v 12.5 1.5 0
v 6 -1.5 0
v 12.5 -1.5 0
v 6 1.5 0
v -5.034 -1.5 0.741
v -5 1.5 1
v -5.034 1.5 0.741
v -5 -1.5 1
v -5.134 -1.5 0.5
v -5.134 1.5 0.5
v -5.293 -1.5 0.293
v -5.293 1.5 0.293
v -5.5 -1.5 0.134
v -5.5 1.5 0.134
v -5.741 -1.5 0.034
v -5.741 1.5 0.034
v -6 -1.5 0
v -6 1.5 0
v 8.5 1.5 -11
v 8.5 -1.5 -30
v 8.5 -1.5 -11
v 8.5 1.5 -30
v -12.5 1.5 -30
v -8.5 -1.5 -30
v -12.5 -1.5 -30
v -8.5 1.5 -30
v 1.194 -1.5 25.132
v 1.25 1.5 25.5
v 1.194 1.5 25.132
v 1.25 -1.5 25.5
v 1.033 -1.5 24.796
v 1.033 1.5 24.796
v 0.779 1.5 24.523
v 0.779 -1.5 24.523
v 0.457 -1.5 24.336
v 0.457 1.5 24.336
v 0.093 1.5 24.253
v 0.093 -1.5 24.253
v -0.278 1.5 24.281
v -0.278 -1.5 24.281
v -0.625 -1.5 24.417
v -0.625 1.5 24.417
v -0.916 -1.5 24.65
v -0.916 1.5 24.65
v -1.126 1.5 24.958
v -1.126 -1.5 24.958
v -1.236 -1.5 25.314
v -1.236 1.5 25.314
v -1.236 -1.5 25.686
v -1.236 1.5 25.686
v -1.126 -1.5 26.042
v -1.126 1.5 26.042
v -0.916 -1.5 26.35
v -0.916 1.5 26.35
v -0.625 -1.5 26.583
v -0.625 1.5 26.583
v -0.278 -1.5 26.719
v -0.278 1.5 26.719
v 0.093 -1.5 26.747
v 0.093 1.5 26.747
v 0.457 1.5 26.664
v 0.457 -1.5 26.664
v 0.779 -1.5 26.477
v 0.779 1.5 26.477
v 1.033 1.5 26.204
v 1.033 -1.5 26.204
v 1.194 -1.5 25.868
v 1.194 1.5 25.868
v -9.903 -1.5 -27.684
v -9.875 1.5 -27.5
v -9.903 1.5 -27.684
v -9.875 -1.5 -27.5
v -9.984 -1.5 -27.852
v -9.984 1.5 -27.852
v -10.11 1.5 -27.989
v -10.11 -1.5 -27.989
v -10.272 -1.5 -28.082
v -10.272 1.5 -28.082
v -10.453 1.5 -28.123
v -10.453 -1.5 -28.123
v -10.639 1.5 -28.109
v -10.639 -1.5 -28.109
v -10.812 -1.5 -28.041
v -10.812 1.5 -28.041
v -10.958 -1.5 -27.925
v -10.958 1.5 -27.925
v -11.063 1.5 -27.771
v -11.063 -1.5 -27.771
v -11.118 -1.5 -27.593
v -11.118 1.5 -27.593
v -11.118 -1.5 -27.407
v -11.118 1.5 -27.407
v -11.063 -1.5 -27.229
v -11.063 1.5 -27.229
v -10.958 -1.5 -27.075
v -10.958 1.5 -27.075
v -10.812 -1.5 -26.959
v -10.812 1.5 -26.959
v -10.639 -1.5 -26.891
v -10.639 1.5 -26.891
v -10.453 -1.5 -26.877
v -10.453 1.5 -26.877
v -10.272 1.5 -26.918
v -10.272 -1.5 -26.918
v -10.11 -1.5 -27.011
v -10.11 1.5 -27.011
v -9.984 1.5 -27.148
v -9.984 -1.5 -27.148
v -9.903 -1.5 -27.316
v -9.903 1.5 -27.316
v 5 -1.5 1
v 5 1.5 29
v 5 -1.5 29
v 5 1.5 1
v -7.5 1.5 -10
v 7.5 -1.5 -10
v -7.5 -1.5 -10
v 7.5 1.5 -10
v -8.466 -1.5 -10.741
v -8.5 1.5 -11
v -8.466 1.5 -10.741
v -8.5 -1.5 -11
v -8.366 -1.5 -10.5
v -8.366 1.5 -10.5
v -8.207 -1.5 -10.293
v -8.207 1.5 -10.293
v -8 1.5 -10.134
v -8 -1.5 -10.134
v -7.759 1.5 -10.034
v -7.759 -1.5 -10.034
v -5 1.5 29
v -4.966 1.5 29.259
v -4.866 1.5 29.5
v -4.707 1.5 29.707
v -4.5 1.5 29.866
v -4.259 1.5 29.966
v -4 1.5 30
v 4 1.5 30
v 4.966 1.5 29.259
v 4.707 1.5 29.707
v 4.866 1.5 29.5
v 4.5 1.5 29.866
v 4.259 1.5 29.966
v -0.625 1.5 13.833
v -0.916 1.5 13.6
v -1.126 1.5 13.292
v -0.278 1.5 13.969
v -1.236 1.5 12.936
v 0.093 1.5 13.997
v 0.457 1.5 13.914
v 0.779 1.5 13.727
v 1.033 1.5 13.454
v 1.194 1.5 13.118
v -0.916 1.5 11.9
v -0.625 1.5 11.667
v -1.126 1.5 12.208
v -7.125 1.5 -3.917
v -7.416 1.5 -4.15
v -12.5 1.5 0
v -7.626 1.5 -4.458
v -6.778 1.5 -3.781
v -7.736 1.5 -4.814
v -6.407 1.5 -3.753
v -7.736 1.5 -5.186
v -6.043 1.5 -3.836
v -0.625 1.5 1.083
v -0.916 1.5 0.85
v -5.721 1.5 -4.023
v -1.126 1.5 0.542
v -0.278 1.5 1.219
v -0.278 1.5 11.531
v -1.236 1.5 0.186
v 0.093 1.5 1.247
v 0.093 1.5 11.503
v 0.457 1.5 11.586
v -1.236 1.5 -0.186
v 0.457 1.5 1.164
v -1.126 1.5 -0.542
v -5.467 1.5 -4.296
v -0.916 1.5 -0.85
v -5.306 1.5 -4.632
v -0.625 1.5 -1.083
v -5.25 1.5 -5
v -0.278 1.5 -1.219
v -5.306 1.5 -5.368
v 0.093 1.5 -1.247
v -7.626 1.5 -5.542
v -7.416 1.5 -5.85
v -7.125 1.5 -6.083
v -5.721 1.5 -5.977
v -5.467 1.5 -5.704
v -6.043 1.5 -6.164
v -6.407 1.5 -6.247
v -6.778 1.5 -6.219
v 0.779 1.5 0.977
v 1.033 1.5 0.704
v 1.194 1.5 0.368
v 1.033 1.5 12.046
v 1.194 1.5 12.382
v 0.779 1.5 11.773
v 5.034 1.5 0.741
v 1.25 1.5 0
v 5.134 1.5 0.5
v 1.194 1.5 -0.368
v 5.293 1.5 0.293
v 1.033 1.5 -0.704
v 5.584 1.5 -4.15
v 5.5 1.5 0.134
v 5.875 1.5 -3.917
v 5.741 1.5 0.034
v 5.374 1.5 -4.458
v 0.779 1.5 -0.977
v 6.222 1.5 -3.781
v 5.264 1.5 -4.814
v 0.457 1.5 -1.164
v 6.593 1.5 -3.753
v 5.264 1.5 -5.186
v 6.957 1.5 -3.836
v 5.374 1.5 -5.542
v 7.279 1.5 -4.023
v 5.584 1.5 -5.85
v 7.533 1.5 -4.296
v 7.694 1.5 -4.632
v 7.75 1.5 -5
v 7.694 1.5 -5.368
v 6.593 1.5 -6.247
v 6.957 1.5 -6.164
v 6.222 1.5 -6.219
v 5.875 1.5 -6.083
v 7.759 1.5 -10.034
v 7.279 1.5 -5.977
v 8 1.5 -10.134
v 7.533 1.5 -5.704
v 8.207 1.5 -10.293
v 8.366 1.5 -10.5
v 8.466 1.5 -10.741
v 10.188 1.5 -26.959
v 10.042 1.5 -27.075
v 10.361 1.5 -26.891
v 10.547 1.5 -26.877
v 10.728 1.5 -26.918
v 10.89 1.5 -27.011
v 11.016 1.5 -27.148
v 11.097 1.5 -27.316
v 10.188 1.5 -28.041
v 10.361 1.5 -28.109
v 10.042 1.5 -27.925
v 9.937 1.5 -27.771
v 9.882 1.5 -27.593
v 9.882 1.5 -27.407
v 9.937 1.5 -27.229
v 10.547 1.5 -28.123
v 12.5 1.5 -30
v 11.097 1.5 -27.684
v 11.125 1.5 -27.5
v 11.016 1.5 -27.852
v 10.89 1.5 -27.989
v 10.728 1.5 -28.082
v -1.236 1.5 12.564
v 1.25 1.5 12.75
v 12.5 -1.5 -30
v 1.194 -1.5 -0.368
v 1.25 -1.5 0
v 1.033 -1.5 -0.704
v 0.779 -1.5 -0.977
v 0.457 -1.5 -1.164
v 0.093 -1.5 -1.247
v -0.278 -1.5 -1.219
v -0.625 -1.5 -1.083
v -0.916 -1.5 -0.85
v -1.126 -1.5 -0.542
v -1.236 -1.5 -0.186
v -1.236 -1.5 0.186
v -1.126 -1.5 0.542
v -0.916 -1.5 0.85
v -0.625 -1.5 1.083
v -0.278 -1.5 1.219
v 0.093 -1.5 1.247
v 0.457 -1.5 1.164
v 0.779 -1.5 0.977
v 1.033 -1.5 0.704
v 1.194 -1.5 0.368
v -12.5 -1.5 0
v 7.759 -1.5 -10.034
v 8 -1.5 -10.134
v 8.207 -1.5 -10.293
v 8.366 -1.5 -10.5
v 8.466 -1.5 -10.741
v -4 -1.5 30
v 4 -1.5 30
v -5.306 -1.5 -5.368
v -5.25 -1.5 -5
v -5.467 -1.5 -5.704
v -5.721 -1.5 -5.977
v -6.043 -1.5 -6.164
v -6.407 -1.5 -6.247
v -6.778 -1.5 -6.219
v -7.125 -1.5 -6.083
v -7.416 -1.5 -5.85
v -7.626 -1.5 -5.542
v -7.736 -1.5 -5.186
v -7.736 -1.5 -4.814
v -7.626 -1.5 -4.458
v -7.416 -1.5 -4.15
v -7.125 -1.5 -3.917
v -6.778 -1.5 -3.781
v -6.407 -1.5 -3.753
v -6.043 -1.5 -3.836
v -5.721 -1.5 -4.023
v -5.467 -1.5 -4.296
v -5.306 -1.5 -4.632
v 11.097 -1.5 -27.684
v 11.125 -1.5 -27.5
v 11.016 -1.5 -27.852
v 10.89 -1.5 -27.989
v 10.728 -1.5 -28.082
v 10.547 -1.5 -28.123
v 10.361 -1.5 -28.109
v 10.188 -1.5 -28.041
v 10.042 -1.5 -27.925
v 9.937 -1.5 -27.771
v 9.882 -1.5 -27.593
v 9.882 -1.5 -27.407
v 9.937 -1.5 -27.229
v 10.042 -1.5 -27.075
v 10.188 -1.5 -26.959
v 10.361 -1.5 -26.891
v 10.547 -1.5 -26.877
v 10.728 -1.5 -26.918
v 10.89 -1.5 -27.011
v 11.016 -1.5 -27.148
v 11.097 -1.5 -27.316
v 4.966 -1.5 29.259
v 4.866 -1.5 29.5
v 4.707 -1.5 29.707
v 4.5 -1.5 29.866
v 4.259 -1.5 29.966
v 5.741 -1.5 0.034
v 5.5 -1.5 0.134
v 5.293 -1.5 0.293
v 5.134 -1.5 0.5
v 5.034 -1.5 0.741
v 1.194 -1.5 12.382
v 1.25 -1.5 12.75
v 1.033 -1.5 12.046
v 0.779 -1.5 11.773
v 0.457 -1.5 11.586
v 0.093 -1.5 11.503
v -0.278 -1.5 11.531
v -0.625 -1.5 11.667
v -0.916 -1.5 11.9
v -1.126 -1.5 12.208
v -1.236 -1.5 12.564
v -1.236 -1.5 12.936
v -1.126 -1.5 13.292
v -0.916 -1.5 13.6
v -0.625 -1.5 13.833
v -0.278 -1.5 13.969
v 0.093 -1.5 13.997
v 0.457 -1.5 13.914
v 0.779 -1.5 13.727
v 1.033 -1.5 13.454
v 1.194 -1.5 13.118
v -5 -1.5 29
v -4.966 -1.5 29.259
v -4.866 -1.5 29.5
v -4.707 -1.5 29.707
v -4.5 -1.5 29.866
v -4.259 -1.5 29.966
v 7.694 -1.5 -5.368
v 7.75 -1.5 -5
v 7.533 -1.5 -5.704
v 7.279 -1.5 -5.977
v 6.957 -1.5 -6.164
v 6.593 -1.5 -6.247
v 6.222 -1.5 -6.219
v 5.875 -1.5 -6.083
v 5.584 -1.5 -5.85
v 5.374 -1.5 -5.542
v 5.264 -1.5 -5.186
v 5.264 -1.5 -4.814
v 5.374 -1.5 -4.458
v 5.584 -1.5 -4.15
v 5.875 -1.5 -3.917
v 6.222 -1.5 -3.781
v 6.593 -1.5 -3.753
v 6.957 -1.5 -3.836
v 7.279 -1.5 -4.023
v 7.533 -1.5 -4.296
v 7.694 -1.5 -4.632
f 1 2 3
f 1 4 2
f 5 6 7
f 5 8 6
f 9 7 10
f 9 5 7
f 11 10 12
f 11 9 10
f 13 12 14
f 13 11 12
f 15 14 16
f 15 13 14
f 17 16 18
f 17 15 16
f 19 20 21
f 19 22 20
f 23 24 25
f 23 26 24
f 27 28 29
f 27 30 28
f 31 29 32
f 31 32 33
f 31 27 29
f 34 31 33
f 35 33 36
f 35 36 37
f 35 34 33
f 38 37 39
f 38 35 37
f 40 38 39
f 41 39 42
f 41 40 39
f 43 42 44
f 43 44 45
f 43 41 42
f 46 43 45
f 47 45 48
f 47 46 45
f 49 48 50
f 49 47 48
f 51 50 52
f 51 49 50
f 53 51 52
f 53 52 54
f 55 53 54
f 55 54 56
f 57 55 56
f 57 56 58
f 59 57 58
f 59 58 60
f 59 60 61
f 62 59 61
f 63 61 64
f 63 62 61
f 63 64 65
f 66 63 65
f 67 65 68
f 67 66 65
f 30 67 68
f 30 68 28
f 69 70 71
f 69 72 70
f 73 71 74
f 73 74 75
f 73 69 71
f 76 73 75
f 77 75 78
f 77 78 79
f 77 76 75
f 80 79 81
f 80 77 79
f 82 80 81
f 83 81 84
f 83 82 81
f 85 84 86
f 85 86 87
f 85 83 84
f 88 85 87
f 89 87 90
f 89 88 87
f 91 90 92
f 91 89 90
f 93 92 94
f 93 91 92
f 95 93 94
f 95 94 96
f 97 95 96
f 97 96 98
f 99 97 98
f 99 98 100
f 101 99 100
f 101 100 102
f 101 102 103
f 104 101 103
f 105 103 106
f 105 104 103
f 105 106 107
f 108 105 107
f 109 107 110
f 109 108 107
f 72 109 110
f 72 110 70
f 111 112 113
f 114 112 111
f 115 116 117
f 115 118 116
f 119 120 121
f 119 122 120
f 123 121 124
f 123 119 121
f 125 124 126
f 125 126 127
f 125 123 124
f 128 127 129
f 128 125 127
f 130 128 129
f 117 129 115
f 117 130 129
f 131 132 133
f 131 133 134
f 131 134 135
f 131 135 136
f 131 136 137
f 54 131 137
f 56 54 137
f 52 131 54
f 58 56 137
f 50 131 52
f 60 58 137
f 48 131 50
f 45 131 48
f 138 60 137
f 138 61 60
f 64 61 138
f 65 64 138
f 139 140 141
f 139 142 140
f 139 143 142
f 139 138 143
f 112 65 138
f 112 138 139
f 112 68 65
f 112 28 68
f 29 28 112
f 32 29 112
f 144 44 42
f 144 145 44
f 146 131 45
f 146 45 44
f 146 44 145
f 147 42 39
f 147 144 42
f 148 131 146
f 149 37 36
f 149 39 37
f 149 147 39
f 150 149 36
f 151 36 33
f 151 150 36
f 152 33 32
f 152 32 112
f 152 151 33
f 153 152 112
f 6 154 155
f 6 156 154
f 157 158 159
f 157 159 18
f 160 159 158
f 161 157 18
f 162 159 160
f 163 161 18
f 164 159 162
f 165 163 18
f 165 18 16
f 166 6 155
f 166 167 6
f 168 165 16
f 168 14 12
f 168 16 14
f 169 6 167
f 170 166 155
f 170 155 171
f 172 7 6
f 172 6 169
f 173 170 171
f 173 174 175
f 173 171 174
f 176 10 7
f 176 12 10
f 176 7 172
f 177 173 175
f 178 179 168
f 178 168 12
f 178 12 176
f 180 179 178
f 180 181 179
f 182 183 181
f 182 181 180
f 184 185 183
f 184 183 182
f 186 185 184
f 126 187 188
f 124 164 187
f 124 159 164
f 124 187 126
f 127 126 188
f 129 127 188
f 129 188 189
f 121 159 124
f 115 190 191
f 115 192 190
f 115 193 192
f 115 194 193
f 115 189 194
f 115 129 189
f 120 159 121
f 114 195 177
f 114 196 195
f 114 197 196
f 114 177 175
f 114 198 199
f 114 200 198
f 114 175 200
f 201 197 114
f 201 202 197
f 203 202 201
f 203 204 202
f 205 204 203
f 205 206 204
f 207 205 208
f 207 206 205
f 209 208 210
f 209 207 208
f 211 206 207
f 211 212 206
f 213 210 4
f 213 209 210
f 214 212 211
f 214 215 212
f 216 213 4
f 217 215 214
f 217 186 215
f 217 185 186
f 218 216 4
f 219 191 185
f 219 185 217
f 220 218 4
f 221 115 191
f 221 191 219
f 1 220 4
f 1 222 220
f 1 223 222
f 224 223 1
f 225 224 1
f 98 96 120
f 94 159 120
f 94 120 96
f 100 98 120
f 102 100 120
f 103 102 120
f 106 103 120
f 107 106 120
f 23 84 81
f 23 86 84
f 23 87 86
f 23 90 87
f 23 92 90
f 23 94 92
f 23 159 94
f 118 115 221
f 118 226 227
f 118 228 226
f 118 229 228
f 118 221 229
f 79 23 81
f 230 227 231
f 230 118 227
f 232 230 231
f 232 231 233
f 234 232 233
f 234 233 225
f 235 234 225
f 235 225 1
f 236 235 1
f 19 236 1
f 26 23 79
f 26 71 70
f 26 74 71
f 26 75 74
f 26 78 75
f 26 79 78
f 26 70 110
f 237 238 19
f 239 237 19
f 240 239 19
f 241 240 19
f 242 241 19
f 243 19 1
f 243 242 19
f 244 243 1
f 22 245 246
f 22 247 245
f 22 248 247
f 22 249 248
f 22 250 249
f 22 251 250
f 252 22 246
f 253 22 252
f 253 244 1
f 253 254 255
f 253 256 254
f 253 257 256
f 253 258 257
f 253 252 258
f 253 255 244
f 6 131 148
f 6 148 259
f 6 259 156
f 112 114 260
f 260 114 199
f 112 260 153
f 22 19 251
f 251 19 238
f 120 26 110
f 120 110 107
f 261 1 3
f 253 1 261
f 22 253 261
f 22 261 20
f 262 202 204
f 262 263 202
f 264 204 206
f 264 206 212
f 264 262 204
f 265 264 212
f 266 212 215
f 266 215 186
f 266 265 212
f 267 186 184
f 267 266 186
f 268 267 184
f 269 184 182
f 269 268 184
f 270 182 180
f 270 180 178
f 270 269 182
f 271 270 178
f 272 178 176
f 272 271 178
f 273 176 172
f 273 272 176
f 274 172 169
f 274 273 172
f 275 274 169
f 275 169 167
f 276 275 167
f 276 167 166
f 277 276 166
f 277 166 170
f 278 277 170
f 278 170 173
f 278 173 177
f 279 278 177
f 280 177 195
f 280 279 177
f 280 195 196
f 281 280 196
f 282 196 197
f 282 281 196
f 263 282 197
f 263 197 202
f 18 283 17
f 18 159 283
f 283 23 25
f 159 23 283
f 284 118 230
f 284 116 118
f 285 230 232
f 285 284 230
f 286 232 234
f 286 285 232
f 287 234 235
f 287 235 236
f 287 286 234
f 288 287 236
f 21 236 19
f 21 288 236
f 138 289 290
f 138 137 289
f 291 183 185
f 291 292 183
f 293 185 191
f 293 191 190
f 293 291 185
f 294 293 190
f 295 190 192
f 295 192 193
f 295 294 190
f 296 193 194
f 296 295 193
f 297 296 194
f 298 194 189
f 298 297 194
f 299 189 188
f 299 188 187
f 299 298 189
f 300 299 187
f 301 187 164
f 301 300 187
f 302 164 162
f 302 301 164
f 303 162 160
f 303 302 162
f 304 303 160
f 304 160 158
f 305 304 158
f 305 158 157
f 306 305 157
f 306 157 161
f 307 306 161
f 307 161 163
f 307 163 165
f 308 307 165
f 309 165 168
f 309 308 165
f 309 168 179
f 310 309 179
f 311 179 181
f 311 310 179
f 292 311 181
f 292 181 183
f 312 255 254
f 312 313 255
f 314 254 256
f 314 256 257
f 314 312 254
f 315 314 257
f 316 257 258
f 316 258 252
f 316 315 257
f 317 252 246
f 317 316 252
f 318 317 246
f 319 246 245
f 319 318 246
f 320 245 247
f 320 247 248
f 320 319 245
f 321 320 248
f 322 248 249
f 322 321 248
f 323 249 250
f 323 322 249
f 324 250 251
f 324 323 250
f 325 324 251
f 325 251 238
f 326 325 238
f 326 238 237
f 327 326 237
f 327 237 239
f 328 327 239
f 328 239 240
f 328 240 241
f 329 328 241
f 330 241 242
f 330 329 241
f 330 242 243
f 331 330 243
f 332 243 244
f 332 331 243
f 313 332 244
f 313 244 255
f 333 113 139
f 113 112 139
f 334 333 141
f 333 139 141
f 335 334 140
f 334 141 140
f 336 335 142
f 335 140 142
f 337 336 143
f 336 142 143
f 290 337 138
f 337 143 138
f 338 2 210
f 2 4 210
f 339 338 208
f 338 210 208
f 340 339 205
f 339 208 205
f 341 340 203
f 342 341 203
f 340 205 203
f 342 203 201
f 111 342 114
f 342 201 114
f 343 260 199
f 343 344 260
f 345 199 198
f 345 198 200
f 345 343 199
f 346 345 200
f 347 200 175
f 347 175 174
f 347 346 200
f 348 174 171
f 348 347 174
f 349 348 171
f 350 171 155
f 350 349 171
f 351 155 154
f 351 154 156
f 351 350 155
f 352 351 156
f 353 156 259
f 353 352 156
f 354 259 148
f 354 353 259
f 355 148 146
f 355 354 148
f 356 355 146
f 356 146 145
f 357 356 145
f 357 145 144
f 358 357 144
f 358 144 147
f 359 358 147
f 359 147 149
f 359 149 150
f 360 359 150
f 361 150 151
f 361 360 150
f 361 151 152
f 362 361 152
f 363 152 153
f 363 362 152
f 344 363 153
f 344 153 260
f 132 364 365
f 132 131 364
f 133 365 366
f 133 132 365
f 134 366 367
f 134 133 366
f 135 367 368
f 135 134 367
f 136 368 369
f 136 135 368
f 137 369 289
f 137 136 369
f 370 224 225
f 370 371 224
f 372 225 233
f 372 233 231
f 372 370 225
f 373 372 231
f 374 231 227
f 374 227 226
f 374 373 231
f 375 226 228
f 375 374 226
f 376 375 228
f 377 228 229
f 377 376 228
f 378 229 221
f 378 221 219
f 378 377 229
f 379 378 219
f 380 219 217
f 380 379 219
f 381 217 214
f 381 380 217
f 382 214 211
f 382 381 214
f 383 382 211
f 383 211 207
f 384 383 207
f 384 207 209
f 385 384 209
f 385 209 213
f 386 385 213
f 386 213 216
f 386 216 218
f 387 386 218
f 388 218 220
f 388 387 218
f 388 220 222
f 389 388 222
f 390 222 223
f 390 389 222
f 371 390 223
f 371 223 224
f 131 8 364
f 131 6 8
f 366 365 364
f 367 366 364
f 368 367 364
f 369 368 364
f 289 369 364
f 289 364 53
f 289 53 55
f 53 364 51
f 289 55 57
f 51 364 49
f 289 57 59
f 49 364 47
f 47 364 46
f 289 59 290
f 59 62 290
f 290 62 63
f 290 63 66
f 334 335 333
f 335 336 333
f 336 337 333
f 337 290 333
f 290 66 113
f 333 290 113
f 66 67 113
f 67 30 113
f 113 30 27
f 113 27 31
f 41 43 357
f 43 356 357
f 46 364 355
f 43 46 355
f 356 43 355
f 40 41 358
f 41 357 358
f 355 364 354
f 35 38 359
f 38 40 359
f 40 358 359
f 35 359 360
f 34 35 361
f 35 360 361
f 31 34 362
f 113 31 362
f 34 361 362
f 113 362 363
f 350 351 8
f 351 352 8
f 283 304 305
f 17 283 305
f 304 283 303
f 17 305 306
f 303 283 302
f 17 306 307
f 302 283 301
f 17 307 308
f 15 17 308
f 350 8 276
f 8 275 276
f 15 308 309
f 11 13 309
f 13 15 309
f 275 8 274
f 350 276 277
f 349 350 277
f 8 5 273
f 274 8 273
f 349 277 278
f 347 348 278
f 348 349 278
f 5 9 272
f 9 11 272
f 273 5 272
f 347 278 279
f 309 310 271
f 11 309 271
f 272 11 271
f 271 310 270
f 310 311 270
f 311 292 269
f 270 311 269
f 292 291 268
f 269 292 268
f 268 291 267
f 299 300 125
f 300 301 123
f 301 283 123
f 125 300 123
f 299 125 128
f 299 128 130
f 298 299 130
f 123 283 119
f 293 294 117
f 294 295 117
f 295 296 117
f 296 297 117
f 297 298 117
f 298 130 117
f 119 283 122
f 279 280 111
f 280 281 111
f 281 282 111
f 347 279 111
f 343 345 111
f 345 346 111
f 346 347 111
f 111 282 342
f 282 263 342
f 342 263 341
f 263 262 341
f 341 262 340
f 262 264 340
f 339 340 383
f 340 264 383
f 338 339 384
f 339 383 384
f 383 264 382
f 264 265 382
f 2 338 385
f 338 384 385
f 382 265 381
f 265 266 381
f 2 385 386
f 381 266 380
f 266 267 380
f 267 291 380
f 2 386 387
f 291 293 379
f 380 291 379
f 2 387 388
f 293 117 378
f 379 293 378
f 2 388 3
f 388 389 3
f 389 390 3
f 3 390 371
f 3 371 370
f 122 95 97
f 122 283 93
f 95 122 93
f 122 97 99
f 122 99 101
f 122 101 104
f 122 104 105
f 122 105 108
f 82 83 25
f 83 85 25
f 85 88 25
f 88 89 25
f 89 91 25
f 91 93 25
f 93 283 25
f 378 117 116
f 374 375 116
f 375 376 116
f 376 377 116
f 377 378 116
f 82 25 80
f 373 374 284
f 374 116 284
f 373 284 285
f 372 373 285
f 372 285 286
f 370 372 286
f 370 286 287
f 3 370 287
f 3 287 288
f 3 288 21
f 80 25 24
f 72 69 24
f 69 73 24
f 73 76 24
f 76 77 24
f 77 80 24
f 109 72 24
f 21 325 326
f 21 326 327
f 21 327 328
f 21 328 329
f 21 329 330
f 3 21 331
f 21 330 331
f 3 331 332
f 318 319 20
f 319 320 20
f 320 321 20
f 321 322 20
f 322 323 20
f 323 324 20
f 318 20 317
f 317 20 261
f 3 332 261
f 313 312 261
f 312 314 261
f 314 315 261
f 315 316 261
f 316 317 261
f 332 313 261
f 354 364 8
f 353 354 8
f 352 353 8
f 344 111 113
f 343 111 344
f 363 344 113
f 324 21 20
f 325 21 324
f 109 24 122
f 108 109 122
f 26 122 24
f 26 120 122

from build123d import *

# Parameters (mm, degrees)
SKETCH1_R           = 1.25
SKETCH1_R_2         = 0.625
BOSS_EXTRUDE1_DEPTH = 1.5
FILLET1_R           = 1


with BuildPart() as part:
    # Sketch1 → Boss-Extrude1 (new body, symmetric)
    with BuildSketch(Plane(origin=(0, 0, 0), x_dir=(1, 0, 0), z_dir=(0, 1, 0))):
        Polygon((-5, 0), (-5, -30), (5, -30), (5, 0), (12.5, 0), (12.5, 30), (8.5, 30), (8.5, 10), (-8.5, 10), (-8.5, 30), (-12.5, 30), (-12.5, 0), align=None)
        Circle(SKETCH1_R, mode=Mode.SUBTRACT)
        with Locations((0, -25.5)):
            Circle(SKETCH1_R, mode=Mode.SUBTRACT)
        with Locations((0, -12.75)):
            Circle(SKETCH1_R, mode=Mode.SUBTRACT)
        with Locations((-6.5, 5)):
            Circle(SKETCH1_R, mode=Mode.SUBTRACT)
        with Locations((6.5, 5)):
            Circle(SKETCH1_R, mode=Mode.SUBTRACT)
        with Locations((-10.5, 27.5)):
            Circle(SKETCH1_R_2, mode=Mode.SUBTRACT)
        with Locations((10.5, 27.5)):
            Circle(SKETCH1_R_2, mode=Mode.SUBTRACT)
    extrude(amount=BOSS_EXTRUDE1_DEPTH, both=True)

    # Fillet1
    fillet1_edges = [part.edges().sort_by_distance(p)[0] for p in [
        (8.5, 0, -10),
        (5, 0, 0),
        (5, 0, 30),
        (-5, 0, 30),
        (-5, 0, 0),
        (-8.5, 0, -10),
    ]]
    fillet(fillet1_edges, radius=FILLET1_R)


solid = part.part
